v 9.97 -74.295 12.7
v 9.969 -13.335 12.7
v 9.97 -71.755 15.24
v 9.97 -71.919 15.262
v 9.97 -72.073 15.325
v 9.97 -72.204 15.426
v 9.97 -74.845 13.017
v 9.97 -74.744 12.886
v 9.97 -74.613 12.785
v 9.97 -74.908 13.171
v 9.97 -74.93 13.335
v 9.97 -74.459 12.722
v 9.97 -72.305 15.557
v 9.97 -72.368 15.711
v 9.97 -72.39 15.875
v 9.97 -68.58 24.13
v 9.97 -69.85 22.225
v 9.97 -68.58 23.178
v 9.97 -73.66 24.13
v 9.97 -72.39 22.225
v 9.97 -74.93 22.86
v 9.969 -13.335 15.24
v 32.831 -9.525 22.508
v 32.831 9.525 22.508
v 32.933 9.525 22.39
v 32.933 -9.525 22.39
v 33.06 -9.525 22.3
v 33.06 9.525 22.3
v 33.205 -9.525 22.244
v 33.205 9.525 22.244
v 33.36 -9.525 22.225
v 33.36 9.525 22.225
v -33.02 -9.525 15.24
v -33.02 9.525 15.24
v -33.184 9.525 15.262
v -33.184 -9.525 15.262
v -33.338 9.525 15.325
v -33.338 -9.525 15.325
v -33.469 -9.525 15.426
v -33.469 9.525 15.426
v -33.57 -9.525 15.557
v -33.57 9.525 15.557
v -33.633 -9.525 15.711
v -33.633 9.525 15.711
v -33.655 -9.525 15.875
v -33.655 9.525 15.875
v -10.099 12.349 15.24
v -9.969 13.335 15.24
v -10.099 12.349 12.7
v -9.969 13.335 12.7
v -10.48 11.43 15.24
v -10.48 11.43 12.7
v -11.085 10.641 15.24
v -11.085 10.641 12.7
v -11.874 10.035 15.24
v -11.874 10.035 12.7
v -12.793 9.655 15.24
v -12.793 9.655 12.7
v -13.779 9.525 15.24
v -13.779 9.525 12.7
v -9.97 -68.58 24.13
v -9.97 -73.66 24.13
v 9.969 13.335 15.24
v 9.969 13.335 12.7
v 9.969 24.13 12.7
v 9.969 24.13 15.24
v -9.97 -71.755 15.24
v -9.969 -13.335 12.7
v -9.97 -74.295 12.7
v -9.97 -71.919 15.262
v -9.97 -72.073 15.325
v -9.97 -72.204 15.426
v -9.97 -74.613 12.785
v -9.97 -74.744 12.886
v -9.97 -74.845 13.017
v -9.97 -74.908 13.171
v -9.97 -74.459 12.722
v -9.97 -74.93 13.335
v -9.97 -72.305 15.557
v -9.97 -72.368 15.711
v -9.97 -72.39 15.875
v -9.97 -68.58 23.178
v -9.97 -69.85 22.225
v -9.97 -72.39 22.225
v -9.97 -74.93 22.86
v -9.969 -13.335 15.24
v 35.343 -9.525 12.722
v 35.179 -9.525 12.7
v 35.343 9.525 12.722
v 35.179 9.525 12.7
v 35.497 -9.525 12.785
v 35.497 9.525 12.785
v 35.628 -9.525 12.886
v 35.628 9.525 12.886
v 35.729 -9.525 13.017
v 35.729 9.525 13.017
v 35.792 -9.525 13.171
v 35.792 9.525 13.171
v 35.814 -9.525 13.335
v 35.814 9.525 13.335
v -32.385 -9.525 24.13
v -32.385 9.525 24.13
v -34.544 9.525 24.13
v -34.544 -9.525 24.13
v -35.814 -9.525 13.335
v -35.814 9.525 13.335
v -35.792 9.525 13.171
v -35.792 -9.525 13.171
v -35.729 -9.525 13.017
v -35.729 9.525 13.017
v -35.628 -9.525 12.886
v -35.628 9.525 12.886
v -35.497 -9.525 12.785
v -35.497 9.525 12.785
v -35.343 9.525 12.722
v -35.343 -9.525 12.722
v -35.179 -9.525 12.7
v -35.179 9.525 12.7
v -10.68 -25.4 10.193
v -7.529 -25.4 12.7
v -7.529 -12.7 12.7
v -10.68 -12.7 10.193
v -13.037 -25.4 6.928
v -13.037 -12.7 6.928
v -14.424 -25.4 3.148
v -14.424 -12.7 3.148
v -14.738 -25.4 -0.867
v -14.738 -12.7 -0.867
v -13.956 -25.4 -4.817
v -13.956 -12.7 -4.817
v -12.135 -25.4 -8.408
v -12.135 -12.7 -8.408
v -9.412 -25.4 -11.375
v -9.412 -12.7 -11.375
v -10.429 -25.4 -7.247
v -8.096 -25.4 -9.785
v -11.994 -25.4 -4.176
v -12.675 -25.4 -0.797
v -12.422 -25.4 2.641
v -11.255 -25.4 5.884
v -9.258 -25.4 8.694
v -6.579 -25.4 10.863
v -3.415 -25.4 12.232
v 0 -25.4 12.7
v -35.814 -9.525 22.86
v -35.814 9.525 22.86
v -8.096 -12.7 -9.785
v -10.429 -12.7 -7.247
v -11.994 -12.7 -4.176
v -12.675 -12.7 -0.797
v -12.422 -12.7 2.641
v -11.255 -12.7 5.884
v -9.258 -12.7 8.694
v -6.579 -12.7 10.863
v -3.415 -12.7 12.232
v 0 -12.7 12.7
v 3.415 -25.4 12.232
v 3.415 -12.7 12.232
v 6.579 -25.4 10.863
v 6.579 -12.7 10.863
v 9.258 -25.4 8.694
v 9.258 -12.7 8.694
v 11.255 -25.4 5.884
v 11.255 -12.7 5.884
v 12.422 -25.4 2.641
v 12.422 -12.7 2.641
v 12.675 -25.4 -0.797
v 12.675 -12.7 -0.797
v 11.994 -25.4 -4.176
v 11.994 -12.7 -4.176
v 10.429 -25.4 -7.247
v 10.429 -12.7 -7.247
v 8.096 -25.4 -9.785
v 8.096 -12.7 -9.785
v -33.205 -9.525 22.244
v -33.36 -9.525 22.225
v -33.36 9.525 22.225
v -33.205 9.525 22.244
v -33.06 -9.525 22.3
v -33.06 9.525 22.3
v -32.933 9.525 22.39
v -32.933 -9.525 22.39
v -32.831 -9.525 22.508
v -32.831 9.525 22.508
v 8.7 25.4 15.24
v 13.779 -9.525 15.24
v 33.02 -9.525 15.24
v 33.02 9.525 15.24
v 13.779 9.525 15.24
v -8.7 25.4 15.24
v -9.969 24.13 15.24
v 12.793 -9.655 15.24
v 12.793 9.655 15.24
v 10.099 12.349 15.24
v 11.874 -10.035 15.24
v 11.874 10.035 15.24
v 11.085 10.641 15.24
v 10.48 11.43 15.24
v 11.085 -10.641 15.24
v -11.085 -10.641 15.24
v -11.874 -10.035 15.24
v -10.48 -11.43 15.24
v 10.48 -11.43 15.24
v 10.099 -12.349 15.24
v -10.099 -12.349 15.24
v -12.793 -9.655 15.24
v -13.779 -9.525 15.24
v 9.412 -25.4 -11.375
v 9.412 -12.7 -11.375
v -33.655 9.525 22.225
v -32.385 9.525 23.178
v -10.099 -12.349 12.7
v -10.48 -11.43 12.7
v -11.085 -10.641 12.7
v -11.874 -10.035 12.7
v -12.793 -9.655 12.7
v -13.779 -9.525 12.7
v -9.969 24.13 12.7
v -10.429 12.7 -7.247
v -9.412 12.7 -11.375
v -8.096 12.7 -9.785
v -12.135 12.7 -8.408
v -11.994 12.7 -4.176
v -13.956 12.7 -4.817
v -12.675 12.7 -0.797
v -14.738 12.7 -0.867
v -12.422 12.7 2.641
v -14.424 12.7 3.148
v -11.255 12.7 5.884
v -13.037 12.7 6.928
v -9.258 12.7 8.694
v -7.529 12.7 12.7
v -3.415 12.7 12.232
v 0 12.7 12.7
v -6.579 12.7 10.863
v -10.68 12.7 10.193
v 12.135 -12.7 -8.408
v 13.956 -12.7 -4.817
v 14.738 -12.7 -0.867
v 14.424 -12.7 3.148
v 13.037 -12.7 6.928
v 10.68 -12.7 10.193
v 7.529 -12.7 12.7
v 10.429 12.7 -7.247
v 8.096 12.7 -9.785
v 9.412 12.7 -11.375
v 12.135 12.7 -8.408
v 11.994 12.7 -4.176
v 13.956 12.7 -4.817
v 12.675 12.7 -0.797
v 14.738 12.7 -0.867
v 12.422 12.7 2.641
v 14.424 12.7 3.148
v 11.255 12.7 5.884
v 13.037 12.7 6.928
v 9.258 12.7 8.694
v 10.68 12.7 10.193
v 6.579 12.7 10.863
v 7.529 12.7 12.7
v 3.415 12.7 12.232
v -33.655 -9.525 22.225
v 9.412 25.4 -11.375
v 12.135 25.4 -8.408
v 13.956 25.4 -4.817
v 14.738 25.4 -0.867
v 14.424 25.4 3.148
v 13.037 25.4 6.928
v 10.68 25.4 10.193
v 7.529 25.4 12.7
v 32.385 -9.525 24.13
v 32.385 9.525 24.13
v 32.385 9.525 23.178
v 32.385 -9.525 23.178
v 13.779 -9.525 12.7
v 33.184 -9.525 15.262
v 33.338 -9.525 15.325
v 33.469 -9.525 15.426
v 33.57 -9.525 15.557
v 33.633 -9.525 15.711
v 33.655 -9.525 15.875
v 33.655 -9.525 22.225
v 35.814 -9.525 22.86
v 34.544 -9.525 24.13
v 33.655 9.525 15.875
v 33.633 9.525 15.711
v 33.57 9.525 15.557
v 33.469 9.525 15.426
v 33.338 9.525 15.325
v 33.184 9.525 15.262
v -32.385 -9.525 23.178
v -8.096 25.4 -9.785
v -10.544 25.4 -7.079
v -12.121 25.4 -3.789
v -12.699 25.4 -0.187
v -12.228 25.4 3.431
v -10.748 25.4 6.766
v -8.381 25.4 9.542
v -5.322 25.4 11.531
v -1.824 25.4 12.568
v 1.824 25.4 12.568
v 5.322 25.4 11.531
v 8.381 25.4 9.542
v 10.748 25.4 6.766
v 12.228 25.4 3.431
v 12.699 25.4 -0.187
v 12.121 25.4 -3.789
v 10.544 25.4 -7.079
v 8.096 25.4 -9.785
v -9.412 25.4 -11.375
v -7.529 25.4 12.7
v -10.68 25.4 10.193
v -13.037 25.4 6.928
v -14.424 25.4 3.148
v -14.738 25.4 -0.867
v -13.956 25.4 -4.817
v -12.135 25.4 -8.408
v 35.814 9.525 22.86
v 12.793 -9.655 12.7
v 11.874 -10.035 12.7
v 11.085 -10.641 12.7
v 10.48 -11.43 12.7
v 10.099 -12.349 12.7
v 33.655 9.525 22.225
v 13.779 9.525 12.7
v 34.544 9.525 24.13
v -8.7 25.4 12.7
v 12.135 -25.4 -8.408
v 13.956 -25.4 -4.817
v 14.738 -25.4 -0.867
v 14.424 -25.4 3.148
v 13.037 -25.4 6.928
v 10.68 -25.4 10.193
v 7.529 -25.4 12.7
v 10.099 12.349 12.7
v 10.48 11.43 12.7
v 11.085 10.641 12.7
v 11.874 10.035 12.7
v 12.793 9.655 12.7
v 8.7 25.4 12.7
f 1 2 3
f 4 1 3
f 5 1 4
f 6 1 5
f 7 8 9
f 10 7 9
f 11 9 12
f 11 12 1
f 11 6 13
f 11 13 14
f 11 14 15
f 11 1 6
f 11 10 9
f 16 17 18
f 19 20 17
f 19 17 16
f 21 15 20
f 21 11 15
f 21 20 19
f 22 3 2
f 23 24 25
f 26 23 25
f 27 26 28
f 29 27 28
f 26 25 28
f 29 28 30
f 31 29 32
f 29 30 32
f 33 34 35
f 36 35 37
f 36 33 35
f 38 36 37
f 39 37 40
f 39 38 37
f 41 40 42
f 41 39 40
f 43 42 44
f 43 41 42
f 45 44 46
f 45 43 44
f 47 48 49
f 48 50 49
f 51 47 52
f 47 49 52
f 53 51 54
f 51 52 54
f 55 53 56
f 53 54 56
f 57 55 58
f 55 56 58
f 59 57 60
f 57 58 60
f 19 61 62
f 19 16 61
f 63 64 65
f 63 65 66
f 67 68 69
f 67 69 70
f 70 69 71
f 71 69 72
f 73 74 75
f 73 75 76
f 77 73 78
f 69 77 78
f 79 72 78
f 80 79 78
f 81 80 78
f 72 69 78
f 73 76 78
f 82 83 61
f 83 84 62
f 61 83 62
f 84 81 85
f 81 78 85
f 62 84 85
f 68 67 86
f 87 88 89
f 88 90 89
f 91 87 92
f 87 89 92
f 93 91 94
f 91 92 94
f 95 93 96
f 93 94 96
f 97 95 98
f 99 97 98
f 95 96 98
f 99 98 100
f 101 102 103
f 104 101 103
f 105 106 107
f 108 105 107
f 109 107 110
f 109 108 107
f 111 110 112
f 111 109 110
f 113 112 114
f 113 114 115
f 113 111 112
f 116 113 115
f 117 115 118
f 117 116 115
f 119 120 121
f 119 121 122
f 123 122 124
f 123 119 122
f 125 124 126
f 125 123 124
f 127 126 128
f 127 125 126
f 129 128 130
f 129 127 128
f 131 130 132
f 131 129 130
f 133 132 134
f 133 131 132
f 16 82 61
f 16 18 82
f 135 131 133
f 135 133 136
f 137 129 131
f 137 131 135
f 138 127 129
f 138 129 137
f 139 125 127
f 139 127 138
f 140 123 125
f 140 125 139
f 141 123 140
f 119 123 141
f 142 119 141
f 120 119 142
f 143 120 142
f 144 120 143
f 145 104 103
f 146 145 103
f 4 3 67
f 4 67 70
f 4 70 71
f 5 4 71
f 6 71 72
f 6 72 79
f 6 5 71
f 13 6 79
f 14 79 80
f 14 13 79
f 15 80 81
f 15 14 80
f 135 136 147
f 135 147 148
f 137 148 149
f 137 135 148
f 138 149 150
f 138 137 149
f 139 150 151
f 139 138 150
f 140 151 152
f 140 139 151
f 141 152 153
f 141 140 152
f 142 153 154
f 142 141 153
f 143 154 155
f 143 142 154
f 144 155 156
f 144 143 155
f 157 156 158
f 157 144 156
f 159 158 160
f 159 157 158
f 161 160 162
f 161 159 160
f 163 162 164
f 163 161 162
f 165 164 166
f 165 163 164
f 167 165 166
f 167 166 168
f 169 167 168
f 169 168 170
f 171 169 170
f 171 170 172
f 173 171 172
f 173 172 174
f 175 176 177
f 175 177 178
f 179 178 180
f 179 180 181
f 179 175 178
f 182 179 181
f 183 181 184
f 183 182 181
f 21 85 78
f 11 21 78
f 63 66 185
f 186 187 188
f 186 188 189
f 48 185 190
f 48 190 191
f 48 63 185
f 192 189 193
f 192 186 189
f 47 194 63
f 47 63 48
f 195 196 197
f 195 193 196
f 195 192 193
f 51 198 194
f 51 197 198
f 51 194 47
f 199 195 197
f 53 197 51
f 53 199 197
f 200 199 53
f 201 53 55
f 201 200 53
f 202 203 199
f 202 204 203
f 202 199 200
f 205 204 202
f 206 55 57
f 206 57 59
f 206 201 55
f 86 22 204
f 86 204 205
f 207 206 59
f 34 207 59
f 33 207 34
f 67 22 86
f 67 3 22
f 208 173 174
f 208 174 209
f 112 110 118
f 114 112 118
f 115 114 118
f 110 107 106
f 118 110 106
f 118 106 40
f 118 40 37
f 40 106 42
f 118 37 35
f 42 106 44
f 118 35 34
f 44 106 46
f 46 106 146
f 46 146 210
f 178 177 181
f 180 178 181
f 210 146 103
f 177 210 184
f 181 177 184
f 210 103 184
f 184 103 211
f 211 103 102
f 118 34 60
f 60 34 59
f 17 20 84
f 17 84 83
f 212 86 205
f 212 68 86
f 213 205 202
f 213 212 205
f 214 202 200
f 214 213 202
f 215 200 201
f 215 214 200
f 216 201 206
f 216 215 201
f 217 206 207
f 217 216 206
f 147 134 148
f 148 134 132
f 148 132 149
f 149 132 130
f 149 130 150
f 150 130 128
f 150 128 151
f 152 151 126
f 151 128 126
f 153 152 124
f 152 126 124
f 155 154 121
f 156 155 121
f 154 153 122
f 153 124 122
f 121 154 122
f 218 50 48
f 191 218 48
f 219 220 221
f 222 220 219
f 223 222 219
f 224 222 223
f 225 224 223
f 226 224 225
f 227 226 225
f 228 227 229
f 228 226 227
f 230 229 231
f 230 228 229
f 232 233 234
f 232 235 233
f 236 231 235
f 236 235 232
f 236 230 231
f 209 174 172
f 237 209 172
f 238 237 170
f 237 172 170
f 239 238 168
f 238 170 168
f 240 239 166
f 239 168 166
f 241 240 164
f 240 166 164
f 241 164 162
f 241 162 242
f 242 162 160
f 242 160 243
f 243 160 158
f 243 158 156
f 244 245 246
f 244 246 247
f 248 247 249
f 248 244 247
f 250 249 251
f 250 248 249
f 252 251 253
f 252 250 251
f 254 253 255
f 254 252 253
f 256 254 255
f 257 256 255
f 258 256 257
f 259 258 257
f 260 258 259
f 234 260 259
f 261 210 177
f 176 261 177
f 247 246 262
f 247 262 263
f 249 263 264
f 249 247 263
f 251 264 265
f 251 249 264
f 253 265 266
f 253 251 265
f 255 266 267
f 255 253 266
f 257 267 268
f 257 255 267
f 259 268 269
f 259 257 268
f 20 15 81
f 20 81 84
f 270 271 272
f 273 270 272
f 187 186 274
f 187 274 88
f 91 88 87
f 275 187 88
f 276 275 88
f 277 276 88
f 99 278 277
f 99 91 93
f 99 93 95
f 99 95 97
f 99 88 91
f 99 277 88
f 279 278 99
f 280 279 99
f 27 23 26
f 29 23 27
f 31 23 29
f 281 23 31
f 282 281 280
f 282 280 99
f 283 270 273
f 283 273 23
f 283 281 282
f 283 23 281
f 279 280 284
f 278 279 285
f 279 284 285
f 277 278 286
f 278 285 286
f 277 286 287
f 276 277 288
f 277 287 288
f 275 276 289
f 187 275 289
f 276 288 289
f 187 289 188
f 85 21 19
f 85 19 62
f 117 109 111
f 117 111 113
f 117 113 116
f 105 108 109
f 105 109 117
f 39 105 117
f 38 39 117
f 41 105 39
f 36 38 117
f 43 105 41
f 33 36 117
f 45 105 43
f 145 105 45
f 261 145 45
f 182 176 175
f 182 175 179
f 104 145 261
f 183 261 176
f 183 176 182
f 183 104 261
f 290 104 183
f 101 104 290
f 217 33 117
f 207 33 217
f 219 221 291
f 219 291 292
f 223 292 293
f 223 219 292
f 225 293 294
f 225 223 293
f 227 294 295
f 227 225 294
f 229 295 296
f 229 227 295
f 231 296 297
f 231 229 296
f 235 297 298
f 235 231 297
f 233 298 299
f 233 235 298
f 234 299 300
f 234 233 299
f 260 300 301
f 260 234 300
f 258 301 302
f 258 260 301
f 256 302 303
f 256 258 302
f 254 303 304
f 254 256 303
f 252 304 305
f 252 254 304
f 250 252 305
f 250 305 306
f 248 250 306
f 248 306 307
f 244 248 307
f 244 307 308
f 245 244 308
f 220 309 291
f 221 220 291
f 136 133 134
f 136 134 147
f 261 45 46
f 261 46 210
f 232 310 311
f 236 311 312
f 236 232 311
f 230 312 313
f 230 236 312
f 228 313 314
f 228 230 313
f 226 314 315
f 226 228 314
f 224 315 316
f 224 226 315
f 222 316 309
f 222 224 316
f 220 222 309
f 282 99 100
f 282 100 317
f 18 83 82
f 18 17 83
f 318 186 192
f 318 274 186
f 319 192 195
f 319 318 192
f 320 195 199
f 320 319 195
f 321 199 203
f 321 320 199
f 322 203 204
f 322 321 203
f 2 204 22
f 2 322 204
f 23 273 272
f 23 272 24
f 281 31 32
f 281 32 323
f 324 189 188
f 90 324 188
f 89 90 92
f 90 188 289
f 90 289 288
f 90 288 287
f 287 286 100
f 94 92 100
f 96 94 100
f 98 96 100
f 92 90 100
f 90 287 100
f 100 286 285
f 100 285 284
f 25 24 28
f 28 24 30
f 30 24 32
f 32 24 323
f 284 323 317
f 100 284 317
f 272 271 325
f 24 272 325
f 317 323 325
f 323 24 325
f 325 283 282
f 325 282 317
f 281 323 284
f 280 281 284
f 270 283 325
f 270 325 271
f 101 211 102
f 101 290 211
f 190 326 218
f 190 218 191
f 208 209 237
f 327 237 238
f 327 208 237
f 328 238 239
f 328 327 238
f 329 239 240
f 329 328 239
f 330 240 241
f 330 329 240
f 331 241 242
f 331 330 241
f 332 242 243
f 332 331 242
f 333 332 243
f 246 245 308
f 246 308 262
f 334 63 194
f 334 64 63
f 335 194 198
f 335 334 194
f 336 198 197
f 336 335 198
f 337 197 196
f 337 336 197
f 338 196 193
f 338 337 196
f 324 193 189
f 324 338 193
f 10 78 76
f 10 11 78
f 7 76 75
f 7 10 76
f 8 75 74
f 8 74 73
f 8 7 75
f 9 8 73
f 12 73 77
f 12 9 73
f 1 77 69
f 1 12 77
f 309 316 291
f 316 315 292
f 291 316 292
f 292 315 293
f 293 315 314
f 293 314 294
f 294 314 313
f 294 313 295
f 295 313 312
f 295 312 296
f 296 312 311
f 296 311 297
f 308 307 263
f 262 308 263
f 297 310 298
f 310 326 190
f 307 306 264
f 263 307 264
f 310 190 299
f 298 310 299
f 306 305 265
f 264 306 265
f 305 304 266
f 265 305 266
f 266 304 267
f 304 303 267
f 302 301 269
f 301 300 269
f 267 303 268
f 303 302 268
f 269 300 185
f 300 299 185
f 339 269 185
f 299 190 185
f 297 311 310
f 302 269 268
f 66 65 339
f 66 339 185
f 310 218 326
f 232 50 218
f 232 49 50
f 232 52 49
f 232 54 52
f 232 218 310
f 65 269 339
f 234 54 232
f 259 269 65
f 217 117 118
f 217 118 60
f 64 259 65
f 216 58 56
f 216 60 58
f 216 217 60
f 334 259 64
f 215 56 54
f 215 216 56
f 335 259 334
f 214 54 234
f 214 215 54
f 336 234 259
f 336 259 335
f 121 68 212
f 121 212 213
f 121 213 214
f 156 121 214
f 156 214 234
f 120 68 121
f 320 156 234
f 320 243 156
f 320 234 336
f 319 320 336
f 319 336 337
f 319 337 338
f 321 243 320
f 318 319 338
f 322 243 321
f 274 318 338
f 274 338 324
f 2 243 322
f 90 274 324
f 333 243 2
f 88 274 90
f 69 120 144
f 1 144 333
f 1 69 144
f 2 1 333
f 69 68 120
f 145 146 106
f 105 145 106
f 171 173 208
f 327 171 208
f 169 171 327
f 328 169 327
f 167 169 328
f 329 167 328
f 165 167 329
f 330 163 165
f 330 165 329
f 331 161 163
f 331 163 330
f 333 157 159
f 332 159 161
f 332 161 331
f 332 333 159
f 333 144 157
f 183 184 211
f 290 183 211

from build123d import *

# Parameters (mm, degrees)
F1_DEPTH       = 25.4
F1_DEPTH_BACK  = 25.4
F2_W           = 25.4
F2_H           = 40.9454388922
F3_DEPTH       = 25.4
F3_DEPTH_BACK  = 25.4
F4_W           = 19.939
F4_H           = 2.54
F5_DEPTH       = 25.4
F5_DEPTH_BACK  = 25.4
F7_DEPTH       = 9.525
F7_DEPTH_BACK  = 9.525
F8_R           = 3.81
F10_DEPTH      = 9.9695
F10_DEPTH_BACK = 9.9695
F11_SIZE       = 1.27
F12_SIZE       = 1.27


with BuildPart() as f1:
    # F0 (on Front) → F1 (new body, two sides)
    with BuildSketch(Plane.XZ) as f1_sk:
        with BuildLine():
            Line((8.09625, -9.7847195125), (9.411890625, -11.3747364332))
            ThreePointArc((9.411890625, -11.3747364332), (0, 14.76375), (-9.411890625, -11.3747364332))
            Line((-9.411890625, -11.3747364332), (-8.09625, -9.7847195125))
            ThreePointArc((-8.09625, -9.7847195125), (0, 12.7), (8.09625, -9.7847195125))
        make_face()
    extrude(amount=F1_DEPTH)
    extrude(f1_sk.sketch, amount=-F1_DEPTH_BACK)

    # F2 (on Right) → F3 (cut, two sides)
    with BuildSketch(Plane.YZ) as f3_sk:
        with Locations((0, 1.1786520481)):
            Rectangle(F2_W, F2_H)
    extrude(amount=-F3_DEPTH, mode=Mode.SUBTRACT)
    extrude(f3_sk.sketch, amount=F3_DEPTH_BACK, mode=Mode.SUBTRACT)

    # F4 (on Front) → F5 (join, two sides)
    with BuildSketch(Plane.XZ) as f5_sk:
        with Locations((0, 13.97)):
            Rectangle(F4_W, F4_H)
    extrude(amount=F5_DEPTH)
    extrude(f5_sk.sketch, amount=-F5_DEPTH_BACK)

    # F6 (on Front) → F7 (join, two sides)
    with BuildSketch(Plane.XZ) as f7_sk:
        with BuildLine():
            Line((-33.655, 12.7), (0, 12.7))
            Line((0, 12.7), (0, 15.24))
            Line((0, 15.24), (-33.02, 15.24))
            ThreePointArc((-33.02, 15.24), (-33.4690128061, 15.4259871939), (-33.655, 15.875))
            Line((-33.655, 15.875), (-33.655, 22.225))
            Line((-33.655, 22.225), (-33.3598416866, 22.225))
            ThreePointArc((-33.3598416866, 22.225), (-33.0602119039, 22.3001366298), (-32.8314897497, 22.5077653754))
            Line((-32.8314897497, 22.5077653754), (-32.385, 23.1775))
            Line((-32.385, 23.1775), (-32.385, 24.13))
            Line((-32.385, 24.13), (-35.814, 24.13))
            Line((-35.814, 24.13), (-35.814, 22.225))
            Line((-35.814, 22.225), (-35.814, 13.335))
            ThreePointArc((-35.814, 13.335), (-35.6280128061, 12.8859871939), (-35.179, 12.7))
            Line((-35.179, 12.7), (-33.655, 12.7))
        make_face()
        with BuildLine():
            Line((0, 15.24), (0, 12.7))
            Line((0, 12.7), (33.655, 12.7))
            Line((33.655, 12.7), (35.179, 12.7))
            ThreePointArc((35.179, 12.7), (35.6280128061, 12.8859871939), (35.814, 13.335))
            Line((35.814, 13.335), (35.814, 22.225))
            Line((35.814, 22.225), (35.814, 24.13))
            Line((35.814, 24.13), (32.385, 24.13))
            Line((32.385, 24.13), (32.385, 23.1775))
            Line((32.385, 23.1775), (32.8314897497, 22.5077653754))
            ThreePointArc((32.8314897497, 22.5077653754), (33.0602119039, 22.3001366298), (33.3598416866, 22.225))
            Line((33.3598416866, 22.225), (33.655, 22.225))
            Line((33.655, 22.225), (33.655, 15.875))
            ThreePointArc((33.655, 15.875), (33.4690128061, 15.4259871939), (33.02, 15.24))
            Line((33.02, 15.24), (0, 15.24))
        make_face()
    extrude(amount=F7_DEPTH)
    extrude(f7_sk.sketch, amount=-F7_DEPTH_BACK)

    # F8
    f8_edges = [f1.edges().sort_by_distance(p)[0] for p in [
        (-9.9695, 9.525, 13.97),
        (9.9695, 9.525, 13.97),
        (9.9695, -9.525, 13.97),
        (-9.9695, -9.525, 13.97),
    ]]
    fillet(f8_edges, radius=F8_R)

    # F9 (on Right) → F10 (join, two sides)
    with BuildSketch(Plane.YZ) as f10_sk:
        with BuildLine():
            Line((-72.39, 12.7), (0, 12.7))
            Line((0, 12.7), (0, 15.24))
            Line((0, 15.24), (-71.755, 15.24))
            ThreePointArc((-71.755, 15.24), (-72.2040128061, 15.4259871939), (-72.39, 15.875))
            Line((-72.39, 15.875), (-72.39, 22.225))
            Line((-72.39, 22.225), (-69.85, 22.225))
            Line((-69.85, 22.225), (-68.58, 23.1775))
            Line((-68.58, 23.1775), (-68.58, 24.13))
            Line((-68.58, 24.13), (-72.39, 24.13))
            Line((-72.39, 24.13), (-74.93, 24.13))
            Line((-74.93, 24.13), (-74.93, 13.335))
            ThreePointArc((-74.93, 13.335), (-74.7440128061, 12.8859871939), (-74.295, 12.7))
            Line((-74.295, 12.7), (-72.39, 12.7))
        make_face()
    extrude(amount=F10_DEPTH)
    extrude(f10_sk.sketch, amount=-F10_DEPTH_BACK)

    # F11
    f11_edges = [f1.edges().sort_by_distance(p)[0] for p in [
        (-9.9695, 25.4, 13.97),
        (9.9695, 25.4, 13.97),
    ]]
    chamfer(f11_edges, length=F11_SIZE)

    # F12
    f12_edges = [f1.edges().sort_by_distance(p)[0] for p in [
        (0, -74.93, 24.13),
        (-35.814, 0, 24.13),
        (35.814, 0, 24.13),
    ]]
    chamfer(f12_edges, length=F12_SIZE)


solid = f1.part
